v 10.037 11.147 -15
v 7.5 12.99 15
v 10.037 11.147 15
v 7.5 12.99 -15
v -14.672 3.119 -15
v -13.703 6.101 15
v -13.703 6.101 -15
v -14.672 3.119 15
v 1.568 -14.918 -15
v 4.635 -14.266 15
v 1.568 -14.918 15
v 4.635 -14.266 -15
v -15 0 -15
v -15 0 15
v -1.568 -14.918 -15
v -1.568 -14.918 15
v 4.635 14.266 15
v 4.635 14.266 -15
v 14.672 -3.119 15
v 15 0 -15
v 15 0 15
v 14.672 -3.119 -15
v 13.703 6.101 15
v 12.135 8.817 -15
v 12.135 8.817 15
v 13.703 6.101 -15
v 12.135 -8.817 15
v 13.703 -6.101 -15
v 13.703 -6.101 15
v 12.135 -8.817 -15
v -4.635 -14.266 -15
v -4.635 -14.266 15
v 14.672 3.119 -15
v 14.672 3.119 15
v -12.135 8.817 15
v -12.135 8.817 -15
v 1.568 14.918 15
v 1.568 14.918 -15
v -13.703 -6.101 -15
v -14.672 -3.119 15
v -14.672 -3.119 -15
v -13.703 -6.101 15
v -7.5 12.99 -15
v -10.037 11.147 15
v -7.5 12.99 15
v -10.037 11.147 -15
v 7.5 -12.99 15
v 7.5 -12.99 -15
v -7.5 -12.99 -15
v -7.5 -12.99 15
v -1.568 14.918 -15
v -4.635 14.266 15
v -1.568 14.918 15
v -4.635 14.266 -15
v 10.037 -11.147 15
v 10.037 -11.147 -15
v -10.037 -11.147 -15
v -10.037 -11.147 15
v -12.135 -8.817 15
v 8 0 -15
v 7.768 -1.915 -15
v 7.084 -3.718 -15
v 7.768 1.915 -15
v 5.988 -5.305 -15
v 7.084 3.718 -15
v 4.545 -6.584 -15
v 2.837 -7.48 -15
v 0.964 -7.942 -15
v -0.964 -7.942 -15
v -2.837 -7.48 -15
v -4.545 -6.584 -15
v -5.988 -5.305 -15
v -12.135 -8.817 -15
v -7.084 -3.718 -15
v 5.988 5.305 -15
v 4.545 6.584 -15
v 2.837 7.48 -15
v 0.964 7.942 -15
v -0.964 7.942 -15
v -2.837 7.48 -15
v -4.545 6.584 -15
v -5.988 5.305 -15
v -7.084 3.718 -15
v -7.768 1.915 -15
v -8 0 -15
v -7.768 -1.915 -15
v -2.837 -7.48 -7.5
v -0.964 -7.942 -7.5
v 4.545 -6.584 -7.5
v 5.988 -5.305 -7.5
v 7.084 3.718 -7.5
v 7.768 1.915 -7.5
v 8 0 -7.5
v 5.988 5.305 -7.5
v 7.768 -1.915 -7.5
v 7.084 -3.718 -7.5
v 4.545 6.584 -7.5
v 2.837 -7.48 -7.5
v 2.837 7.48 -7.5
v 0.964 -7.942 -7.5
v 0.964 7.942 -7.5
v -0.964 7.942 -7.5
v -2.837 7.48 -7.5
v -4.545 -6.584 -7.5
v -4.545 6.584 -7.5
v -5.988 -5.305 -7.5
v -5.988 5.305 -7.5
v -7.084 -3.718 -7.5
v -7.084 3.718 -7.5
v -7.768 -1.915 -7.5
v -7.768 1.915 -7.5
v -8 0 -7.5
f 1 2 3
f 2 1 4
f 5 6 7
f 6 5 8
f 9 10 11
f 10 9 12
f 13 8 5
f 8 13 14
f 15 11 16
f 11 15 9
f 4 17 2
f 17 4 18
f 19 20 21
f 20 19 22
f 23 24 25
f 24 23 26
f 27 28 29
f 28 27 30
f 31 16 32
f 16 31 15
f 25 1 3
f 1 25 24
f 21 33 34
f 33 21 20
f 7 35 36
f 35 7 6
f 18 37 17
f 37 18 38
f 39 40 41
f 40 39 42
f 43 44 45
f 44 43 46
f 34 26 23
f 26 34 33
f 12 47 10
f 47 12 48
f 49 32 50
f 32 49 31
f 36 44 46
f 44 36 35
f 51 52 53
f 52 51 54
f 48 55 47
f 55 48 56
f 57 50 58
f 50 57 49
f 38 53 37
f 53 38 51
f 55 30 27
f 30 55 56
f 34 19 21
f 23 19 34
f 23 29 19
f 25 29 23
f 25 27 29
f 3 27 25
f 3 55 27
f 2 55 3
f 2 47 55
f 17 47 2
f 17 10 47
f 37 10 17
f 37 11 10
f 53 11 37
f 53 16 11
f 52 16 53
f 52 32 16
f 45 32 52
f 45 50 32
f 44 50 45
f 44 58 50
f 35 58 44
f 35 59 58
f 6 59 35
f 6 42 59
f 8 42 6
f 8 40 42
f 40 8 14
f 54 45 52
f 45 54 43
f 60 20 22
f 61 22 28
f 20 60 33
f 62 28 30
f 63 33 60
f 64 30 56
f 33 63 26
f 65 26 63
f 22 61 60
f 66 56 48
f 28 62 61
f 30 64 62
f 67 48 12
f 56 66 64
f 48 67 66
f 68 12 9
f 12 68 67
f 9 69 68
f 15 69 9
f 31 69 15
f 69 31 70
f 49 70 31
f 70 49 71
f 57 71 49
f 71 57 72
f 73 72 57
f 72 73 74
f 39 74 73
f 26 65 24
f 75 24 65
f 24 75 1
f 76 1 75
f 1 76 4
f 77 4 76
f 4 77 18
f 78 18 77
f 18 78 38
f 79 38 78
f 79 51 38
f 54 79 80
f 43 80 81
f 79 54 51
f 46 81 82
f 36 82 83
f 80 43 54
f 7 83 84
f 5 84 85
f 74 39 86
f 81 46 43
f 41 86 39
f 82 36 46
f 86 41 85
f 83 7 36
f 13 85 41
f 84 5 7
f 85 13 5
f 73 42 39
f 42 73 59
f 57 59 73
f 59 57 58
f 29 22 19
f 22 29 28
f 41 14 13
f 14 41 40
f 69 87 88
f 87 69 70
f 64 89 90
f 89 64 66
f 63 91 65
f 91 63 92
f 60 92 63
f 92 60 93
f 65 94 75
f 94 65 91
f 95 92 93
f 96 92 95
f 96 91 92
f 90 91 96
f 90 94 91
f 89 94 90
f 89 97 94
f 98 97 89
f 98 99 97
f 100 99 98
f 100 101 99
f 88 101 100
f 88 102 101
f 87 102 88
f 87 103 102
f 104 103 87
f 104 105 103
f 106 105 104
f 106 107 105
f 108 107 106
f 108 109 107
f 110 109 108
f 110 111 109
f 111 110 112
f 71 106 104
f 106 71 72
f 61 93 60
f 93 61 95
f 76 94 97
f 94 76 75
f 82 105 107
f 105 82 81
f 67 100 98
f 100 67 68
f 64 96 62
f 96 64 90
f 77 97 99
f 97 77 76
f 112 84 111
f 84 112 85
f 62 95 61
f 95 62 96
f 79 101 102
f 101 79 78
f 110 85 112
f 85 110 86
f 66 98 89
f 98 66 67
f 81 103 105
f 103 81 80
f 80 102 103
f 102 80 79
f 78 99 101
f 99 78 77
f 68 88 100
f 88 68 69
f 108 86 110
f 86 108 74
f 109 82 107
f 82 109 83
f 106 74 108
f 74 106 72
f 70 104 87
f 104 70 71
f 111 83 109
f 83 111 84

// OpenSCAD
diameter = 30;
hole_diameter = 16;

difference() {
    foot();
    hole();
}

module foot() {
    // torus
    color([0.5, 0.5, 0.5])
    union() {
        rotate_extrude()
            translate([diameter/2, 0, 0])
                circle(r = diameter/2);
        // fill the hole
        cylinder(r = diameter/2, h = diameter, center = true);
    }
}

module hole() {
    color("red")
    translate([0, 0, -diameter/2])
    cylinder(r = hole_diameter/2, h = diameter/2, center = true);
}
